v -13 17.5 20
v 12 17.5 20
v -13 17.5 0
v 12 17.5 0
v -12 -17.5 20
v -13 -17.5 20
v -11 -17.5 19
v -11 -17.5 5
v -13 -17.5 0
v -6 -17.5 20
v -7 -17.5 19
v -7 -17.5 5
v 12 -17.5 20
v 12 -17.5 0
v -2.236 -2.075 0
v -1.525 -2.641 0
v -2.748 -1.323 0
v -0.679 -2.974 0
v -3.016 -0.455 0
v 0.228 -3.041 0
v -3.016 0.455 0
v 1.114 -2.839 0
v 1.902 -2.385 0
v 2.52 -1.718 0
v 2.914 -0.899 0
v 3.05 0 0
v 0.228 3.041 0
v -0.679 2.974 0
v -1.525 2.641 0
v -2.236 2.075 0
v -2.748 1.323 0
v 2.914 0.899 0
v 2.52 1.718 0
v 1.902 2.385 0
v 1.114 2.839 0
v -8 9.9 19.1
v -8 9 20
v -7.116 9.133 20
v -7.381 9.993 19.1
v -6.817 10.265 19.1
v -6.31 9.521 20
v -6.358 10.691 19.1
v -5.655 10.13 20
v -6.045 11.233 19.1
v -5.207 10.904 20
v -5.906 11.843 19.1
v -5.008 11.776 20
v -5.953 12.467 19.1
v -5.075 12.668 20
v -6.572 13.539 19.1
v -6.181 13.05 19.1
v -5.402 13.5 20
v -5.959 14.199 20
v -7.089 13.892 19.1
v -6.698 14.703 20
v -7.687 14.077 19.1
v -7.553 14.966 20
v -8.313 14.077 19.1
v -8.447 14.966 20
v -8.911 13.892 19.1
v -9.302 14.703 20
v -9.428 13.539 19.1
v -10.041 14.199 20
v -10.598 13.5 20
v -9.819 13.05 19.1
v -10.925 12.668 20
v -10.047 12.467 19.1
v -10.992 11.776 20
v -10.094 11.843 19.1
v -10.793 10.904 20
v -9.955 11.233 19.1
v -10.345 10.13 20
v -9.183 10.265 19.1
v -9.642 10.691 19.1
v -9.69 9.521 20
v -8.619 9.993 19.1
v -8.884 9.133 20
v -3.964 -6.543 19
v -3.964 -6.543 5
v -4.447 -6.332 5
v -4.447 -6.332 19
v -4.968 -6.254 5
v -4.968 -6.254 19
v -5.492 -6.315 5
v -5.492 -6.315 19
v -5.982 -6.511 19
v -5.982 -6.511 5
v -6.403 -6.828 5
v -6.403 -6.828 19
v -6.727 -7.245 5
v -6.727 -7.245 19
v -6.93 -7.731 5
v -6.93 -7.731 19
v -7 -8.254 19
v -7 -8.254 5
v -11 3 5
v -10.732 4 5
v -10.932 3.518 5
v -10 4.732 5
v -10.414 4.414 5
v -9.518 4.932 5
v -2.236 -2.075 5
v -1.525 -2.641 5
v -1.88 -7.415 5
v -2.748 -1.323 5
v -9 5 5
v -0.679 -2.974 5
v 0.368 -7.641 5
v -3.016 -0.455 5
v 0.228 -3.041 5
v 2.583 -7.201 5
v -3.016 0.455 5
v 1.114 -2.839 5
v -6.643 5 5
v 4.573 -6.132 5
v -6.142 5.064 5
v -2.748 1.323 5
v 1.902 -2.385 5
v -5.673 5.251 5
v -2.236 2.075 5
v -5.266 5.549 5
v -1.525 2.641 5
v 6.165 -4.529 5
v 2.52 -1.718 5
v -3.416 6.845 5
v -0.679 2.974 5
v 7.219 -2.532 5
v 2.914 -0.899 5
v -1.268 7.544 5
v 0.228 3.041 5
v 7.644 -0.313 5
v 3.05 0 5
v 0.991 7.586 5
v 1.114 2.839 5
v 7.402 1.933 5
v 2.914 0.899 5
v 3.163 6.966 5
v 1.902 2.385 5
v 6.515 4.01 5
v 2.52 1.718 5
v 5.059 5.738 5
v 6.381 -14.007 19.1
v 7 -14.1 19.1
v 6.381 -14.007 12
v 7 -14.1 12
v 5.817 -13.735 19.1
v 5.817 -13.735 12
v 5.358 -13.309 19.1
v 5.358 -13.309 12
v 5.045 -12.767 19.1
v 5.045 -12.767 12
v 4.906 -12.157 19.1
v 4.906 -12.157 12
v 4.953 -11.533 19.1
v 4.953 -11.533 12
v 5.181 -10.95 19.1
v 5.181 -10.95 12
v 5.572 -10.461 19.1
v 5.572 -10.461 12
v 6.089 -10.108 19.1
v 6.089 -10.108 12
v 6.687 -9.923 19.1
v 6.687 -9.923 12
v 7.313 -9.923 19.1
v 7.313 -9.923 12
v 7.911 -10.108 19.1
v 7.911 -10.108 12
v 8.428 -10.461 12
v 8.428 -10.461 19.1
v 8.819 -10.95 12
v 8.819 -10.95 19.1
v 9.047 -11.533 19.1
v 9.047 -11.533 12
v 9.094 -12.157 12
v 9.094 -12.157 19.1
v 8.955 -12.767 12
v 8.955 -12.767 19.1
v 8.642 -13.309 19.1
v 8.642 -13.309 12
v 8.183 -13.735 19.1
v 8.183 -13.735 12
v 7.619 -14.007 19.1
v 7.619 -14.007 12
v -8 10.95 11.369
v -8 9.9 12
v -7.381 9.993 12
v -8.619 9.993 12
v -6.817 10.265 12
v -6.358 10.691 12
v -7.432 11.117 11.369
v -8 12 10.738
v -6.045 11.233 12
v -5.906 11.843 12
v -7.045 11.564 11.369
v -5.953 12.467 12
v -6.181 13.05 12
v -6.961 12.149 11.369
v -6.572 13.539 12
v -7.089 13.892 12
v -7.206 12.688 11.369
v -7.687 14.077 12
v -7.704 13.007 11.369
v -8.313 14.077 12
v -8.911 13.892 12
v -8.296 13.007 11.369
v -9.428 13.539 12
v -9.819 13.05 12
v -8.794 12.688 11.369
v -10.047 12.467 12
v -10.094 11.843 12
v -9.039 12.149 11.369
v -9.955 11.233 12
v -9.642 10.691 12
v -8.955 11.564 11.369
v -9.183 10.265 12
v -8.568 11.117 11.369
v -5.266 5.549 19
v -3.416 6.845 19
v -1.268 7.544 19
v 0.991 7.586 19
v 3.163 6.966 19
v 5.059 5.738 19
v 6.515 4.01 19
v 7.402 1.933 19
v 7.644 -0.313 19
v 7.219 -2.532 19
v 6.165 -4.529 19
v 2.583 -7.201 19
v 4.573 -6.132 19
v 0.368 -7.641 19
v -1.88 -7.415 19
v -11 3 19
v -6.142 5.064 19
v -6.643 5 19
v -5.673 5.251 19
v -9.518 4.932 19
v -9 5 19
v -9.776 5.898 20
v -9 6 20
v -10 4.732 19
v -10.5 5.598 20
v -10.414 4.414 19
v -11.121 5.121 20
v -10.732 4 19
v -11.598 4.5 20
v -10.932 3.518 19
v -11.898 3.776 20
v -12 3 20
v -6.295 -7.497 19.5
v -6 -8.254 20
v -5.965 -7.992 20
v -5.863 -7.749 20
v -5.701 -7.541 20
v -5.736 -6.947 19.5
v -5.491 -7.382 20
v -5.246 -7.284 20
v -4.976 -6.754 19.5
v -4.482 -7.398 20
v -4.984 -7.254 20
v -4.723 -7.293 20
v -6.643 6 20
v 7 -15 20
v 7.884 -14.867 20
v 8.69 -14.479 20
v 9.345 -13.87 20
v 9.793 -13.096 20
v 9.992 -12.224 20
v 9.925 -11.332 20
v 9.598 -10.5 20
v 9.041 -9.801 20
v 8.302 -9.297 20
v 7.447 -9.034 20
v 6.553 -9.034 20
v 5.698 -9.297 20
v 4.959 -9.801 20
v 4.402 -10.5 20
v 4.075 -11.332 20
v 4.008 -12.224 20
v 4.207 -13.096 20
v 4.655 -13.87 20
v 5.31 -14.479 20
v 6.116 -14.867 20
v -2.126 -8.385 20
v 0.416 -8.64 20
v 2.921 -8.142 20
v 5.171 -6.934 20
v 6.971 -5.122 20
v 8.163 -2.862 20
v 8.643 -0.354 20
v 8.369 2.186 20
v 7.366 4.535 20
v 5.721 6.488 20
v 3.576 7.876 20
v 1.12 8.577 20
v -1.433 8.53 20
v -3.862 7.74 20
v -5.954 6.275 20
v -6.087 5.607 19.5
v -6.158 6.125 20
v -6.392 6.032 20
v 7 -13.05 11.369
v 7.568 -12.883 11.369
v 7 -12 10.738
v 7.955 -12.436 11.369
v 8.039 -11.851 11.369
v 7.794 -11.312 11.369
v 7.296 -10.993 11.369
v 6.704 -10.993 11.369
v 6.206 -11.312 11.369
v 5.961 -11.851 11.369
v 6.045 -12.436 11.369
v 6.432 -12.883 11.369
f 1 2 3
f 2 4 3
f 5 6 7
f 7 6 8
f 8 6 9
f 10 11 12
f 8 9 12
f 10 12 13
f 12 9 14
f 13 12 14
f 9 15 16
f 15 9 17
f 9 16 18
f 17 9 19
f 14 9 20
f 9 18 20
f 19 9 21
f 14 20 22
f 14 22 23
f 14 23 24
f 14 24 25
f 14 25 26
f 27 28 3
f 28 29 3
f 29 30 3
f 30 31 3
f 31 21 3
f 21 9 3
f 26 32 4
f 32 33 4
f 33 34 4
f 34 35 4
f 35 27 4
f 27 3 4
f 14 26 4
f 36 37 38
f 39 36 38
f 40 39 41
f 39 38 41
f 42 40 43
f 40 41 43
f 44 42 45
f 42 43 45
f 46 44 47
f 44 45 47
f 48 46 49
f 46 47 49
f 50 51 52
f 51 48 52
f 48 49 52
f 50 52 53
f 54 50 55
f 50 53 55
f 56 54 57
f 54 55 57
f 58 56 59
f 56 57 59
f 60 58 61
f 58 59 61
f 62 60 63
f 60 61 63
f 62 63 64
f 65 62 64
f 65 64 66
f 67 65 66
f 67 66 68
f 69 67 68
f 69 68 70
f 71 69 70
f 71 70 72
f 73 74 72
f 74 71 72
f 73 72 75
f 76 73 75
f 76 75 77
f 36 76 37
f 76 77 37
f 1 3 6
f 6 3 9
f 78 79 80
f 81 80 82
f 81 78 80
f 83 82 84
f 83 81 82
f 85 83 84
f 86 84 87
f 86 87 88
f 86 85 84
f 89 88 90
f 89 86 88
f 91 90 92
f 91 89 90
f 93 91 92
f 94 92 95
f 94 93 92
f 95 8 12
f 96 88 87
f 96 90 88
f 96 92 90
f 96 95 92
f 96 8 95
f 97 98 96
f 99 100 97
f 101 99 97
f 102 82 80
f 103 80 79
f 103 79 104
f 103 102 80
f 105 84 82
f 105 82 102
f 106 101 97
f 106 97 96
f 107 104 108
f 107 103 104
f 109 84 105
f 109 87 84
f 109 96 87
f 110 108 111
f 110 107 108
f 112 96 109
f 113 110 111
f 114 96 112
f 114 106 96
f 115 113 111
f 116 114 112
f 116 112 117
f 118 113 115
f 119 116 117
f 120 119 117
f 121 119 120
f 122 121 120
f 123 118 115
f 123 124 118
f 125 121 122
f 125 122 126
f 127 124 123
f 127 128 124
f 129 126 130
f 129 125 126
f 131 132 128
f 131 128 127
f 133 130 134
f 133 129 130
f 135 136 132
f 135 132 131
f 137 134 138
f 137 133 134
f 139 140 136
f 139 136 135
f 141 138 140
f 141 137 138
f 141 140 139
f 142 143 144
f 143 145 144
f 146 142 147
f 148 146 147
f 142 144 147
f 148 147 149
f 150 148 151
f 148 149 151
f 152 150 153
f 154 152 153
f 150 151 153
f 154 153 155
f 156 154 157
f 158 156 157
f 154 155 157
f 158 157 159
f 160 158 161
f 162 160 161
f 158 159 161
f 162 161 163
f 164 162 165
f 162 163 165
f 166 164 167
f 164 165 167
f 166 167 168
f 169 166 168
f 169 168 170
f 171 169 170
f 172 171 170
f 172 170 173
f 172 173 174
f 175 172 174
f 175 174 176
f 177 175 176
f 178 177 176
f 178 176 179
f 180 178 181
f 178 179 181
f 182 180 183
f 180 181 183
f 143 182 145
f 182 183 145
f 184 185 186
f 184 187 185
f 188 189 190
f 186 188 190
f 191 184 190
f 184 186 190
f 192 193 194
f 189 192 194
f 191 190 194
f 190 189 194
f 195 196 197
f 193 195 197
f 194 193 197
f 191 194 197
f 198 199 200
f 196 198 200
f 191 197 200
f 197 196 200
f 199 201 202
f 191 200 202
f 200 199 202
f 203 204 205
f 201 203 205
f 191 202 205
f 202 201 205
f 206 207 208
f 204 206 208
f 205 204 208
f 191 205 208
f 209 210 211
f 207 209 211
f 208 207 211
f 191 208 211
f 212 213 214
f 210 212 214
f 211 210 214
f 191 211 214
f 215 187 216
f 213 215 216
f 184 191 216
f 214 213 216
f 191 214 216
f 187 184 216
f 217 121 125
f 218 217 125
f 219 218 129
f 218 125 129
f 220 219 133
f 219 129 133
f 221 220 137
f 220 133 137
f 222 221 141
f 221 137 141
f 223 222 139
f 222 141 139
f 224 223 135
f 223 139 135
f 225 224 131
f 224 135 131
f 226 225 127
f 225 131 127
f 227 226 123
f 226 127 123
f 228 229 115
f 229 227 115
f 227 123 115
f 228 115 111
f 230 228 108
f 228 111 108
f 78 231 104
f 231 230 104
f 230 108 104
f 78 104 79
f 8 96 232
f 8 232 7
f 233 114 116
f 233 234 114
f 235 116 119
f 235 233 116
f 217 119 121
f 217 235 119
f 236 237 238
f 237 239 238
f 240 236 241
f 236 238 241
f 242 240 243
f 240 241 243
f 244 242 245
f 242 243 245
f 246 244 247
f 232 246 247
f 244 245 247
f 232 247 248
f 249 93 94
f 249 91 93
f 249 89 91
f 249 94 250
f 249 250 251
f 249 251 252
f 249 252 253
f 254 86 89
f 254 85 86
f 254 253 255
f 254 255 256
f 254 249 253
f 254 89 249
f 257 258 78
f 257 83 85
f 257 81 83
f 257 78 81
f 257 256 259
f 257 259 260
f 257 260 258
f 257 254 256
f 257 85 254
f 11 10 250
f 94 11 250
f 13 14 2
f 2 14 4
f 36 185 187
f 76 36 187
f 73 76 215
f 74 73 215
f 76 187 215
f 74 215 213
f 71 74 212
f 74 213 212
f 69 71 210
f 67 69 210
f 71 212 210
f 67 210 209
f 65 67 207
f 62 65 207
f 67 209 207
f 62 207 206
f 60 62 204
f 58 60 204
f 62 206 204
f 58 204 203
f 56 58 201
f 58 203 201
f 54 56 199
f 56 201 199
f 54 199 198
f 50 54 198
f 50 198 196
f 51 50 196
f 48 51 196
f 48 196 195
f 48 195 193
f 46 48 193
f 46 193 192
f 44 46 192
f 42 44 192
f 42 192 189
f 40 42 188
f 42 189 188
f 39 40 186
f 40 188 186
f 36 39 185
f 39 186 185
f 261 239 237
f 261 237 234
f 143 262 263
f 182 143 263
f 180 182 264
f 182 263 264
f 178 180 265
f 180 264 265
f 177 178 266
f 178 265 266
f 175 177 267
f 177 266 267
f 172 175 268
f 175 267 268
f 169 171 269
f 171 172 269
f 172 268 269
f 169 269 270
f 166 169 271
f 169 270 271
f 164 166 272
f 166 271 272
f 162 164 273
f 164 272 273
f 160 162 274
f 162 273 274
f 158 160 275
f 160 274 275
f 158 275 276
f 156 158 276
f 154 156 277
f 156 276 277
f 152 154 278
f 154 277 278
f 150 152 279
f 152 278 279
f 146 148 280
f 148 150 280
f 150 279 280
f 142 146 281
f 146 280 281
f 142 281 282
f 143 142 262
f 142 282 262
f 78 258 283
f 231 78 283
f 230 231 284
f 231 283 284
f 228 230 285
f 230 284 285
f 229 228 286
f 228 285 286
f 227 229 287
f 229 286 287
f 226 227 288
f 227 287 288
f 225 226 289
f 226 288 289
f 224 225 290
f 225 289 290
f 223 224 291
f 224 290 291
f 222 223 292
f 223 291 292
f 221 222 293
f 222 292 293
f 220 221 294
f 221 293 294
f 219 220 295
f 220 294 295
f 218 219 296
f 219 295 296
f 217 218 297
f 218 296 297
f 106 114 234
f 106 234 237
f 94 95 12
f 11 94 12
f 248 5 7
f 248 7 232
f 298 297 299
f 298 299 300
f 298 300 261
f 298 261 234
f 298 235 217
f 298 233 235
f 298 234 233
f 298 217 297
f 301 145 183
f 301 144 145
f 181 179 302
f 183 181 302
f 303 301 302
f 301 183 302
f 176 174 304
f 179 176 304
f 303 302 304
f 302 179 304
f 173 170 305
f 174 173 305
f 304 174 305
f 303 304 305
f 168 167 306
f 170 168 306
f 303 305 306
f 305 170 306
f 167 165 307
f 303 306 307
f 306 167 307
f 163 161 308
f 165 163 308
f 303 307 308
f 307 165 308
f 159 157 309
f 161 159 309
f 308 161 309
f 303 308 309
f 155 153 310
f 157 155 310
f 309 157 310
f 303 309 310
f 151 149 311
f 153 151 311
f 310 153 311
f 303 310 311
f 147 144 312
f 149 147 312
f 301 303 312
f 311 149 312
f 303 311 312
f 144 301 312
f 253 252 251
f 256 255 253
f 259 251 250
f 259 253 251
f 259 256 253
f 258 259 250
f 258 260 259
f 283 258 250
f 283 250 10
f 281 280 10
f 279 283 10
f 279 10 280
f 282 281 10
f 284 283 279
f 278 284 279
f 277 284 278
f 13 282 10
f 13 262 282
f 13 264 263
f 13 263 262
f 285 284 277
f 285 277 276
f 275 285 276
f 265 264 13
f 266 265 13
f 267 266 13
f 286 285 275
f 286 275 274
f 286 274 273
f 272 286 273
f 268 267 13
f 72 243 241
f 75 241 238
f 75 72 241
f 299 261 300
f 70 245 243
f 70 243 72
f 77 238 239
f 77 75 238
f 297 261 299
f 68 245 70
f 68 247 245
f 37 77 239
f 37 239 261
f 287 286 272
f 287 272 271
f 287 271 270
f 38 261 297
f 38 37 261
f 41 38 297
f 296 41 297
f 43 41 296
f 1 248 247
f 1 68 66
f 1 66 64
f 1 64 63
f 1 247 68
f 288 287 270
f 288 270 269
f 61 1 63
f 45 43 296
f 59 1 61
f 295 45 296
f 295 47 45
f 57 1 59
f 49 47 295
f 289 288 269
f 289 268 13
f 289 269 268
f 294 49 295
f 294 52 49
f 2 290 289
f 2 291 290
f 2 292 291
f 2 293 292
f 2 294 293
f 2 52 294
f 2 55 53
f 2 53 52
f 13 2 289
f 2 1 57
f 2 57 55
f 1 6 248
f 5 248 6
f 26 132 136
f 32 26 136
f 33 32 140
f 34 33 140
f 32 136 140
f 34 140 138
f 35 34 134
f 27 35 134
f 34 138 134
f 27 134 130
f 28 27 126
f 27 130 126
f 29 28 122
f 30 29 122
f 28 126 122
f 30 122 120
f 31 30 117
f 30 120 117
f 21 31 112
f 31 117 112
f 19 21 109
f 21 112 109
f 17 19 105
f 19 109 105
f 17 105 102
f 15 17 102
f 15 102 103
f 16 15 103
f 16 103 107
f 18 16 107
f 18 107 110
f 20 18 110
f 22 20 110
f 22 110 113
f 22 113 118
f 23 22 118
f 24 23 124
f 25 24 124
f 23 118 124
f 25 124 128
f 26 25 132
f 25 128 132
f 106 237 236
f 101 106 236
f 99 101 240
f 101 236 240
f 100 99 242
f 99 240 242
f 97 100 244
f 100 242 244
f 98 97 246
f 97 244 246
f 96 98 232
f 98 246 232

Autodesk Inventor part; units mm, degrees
ref_plane "YZ Plane" through (0, 0, 0) normal (1, 0, 0) x (0, 1, 0)
ref_plane "XZ Plane" through (0, 0, 0) normal (0, 1, 0) x (-1, 0, 0)
ref_plane "XY Plane" through (0, 0, 0) normal (0, 0, 1) x (1, 0, 0)
sketch "Sketch1" plane through (0, 0, 0) normal (0, 0, 1) x (1, 0, 0)
  line L0 (12, 17.5) -> (-13, 17.5)
  line L1 (-13, 17.5) -> (-13, -17.5)
  line L2 (-13, -17.5) -> (12, -17.5)
  line L3 (12, -17.5) -> (12, 17.5)
  point P0 (0, 0)
  point P1 (12, 0)
  dimension "d0" = 25
  dimension "d1" = 35
  dimension "d16" = 12
extrude "Extrusion1" add sketch "Sketch1" along normal blind 5
sketch "Sketch2" plane through (0, 0, 5) normal (0, 0, 1) x (1, 0, 0)
  circle A0 centre (0, 0) radius 3.05
  dimension "d4" = 6.1
extrude "Extrusion2" cut sketch "Sketch2" against normal up to next
sketch "Sketch4" plane through (0, 0, 5) normal (0, 0, 1) x (1, 0, 0)
  circle A0 centre (0, 0) radius 3.05 projected
  arc A1 (-7, -3.0859) -> (-5.7899, 5) centre (0, 0) ccw
  line L0 (-5.7899, 5) -> (-11, 5)
  line L1 (-11, 5) -> (-11, -17.5)
  line L2 (-13, -17.5) -> (12, -17.5) projected
  line L3 (-7, -3.0859) -> (-7, -17.5)
  circle A2 centre (0, 0) radius 3.05 projected
  line L4 (12, 17.5) -> (-13, 17.5) projected
  line L5 (-13, 17.5) -> (-13, -17.5) projected
  line L6 (-13, -17.5) -> (12, -17.5) projected
  line L7 (12, -17.5) -> (12, 17.5) projected
  dimension "d9" = 15.3
  dimension "d10" = 11
  dimension "d11" = 7
  dimension "d12" = 5
extrude "Extrusion3" add sketch "Sketch4" along normal blind 15 contours A1 L0 L1 L2 L5 L4 L7 L3
fillet "Fillet1" radius 2 3 edges at (-7, -3.0859, 12.5) (-5.7899, 5, 12.5) (-11, 5, 12.5)
sketch "Sketch5" plane through (0, 0, 20) normal (0, 0, 1) x (1, 0, 0)
  point P0 (0, 0)
  point P1 (-8, 12)
  point P2 (7, -12)
  dimension "d17" = 7
  dimension "d18" = 12
  dimension "d19" = 12
  dimension "d20" = 8
hole "Hole1" at (-8, 12, 20) at (7, -12, 20) direction (0, 0, -1) diameter 4.2 depth 8 tip angle 118 countersink diameter 6 countersink angle 90
chamfer "Chamfer1" distance 1 angle 45 6 edges at (7.606, 0.819, 20) (-5.9817, -6.5111, 20) (-7, -12.8768, 20) (-5.9014, 5.1424, 20) (-7.8212, 5, 20) (-11, -7.25, 20)
properties part number "Base" material "ABS Plastic"
